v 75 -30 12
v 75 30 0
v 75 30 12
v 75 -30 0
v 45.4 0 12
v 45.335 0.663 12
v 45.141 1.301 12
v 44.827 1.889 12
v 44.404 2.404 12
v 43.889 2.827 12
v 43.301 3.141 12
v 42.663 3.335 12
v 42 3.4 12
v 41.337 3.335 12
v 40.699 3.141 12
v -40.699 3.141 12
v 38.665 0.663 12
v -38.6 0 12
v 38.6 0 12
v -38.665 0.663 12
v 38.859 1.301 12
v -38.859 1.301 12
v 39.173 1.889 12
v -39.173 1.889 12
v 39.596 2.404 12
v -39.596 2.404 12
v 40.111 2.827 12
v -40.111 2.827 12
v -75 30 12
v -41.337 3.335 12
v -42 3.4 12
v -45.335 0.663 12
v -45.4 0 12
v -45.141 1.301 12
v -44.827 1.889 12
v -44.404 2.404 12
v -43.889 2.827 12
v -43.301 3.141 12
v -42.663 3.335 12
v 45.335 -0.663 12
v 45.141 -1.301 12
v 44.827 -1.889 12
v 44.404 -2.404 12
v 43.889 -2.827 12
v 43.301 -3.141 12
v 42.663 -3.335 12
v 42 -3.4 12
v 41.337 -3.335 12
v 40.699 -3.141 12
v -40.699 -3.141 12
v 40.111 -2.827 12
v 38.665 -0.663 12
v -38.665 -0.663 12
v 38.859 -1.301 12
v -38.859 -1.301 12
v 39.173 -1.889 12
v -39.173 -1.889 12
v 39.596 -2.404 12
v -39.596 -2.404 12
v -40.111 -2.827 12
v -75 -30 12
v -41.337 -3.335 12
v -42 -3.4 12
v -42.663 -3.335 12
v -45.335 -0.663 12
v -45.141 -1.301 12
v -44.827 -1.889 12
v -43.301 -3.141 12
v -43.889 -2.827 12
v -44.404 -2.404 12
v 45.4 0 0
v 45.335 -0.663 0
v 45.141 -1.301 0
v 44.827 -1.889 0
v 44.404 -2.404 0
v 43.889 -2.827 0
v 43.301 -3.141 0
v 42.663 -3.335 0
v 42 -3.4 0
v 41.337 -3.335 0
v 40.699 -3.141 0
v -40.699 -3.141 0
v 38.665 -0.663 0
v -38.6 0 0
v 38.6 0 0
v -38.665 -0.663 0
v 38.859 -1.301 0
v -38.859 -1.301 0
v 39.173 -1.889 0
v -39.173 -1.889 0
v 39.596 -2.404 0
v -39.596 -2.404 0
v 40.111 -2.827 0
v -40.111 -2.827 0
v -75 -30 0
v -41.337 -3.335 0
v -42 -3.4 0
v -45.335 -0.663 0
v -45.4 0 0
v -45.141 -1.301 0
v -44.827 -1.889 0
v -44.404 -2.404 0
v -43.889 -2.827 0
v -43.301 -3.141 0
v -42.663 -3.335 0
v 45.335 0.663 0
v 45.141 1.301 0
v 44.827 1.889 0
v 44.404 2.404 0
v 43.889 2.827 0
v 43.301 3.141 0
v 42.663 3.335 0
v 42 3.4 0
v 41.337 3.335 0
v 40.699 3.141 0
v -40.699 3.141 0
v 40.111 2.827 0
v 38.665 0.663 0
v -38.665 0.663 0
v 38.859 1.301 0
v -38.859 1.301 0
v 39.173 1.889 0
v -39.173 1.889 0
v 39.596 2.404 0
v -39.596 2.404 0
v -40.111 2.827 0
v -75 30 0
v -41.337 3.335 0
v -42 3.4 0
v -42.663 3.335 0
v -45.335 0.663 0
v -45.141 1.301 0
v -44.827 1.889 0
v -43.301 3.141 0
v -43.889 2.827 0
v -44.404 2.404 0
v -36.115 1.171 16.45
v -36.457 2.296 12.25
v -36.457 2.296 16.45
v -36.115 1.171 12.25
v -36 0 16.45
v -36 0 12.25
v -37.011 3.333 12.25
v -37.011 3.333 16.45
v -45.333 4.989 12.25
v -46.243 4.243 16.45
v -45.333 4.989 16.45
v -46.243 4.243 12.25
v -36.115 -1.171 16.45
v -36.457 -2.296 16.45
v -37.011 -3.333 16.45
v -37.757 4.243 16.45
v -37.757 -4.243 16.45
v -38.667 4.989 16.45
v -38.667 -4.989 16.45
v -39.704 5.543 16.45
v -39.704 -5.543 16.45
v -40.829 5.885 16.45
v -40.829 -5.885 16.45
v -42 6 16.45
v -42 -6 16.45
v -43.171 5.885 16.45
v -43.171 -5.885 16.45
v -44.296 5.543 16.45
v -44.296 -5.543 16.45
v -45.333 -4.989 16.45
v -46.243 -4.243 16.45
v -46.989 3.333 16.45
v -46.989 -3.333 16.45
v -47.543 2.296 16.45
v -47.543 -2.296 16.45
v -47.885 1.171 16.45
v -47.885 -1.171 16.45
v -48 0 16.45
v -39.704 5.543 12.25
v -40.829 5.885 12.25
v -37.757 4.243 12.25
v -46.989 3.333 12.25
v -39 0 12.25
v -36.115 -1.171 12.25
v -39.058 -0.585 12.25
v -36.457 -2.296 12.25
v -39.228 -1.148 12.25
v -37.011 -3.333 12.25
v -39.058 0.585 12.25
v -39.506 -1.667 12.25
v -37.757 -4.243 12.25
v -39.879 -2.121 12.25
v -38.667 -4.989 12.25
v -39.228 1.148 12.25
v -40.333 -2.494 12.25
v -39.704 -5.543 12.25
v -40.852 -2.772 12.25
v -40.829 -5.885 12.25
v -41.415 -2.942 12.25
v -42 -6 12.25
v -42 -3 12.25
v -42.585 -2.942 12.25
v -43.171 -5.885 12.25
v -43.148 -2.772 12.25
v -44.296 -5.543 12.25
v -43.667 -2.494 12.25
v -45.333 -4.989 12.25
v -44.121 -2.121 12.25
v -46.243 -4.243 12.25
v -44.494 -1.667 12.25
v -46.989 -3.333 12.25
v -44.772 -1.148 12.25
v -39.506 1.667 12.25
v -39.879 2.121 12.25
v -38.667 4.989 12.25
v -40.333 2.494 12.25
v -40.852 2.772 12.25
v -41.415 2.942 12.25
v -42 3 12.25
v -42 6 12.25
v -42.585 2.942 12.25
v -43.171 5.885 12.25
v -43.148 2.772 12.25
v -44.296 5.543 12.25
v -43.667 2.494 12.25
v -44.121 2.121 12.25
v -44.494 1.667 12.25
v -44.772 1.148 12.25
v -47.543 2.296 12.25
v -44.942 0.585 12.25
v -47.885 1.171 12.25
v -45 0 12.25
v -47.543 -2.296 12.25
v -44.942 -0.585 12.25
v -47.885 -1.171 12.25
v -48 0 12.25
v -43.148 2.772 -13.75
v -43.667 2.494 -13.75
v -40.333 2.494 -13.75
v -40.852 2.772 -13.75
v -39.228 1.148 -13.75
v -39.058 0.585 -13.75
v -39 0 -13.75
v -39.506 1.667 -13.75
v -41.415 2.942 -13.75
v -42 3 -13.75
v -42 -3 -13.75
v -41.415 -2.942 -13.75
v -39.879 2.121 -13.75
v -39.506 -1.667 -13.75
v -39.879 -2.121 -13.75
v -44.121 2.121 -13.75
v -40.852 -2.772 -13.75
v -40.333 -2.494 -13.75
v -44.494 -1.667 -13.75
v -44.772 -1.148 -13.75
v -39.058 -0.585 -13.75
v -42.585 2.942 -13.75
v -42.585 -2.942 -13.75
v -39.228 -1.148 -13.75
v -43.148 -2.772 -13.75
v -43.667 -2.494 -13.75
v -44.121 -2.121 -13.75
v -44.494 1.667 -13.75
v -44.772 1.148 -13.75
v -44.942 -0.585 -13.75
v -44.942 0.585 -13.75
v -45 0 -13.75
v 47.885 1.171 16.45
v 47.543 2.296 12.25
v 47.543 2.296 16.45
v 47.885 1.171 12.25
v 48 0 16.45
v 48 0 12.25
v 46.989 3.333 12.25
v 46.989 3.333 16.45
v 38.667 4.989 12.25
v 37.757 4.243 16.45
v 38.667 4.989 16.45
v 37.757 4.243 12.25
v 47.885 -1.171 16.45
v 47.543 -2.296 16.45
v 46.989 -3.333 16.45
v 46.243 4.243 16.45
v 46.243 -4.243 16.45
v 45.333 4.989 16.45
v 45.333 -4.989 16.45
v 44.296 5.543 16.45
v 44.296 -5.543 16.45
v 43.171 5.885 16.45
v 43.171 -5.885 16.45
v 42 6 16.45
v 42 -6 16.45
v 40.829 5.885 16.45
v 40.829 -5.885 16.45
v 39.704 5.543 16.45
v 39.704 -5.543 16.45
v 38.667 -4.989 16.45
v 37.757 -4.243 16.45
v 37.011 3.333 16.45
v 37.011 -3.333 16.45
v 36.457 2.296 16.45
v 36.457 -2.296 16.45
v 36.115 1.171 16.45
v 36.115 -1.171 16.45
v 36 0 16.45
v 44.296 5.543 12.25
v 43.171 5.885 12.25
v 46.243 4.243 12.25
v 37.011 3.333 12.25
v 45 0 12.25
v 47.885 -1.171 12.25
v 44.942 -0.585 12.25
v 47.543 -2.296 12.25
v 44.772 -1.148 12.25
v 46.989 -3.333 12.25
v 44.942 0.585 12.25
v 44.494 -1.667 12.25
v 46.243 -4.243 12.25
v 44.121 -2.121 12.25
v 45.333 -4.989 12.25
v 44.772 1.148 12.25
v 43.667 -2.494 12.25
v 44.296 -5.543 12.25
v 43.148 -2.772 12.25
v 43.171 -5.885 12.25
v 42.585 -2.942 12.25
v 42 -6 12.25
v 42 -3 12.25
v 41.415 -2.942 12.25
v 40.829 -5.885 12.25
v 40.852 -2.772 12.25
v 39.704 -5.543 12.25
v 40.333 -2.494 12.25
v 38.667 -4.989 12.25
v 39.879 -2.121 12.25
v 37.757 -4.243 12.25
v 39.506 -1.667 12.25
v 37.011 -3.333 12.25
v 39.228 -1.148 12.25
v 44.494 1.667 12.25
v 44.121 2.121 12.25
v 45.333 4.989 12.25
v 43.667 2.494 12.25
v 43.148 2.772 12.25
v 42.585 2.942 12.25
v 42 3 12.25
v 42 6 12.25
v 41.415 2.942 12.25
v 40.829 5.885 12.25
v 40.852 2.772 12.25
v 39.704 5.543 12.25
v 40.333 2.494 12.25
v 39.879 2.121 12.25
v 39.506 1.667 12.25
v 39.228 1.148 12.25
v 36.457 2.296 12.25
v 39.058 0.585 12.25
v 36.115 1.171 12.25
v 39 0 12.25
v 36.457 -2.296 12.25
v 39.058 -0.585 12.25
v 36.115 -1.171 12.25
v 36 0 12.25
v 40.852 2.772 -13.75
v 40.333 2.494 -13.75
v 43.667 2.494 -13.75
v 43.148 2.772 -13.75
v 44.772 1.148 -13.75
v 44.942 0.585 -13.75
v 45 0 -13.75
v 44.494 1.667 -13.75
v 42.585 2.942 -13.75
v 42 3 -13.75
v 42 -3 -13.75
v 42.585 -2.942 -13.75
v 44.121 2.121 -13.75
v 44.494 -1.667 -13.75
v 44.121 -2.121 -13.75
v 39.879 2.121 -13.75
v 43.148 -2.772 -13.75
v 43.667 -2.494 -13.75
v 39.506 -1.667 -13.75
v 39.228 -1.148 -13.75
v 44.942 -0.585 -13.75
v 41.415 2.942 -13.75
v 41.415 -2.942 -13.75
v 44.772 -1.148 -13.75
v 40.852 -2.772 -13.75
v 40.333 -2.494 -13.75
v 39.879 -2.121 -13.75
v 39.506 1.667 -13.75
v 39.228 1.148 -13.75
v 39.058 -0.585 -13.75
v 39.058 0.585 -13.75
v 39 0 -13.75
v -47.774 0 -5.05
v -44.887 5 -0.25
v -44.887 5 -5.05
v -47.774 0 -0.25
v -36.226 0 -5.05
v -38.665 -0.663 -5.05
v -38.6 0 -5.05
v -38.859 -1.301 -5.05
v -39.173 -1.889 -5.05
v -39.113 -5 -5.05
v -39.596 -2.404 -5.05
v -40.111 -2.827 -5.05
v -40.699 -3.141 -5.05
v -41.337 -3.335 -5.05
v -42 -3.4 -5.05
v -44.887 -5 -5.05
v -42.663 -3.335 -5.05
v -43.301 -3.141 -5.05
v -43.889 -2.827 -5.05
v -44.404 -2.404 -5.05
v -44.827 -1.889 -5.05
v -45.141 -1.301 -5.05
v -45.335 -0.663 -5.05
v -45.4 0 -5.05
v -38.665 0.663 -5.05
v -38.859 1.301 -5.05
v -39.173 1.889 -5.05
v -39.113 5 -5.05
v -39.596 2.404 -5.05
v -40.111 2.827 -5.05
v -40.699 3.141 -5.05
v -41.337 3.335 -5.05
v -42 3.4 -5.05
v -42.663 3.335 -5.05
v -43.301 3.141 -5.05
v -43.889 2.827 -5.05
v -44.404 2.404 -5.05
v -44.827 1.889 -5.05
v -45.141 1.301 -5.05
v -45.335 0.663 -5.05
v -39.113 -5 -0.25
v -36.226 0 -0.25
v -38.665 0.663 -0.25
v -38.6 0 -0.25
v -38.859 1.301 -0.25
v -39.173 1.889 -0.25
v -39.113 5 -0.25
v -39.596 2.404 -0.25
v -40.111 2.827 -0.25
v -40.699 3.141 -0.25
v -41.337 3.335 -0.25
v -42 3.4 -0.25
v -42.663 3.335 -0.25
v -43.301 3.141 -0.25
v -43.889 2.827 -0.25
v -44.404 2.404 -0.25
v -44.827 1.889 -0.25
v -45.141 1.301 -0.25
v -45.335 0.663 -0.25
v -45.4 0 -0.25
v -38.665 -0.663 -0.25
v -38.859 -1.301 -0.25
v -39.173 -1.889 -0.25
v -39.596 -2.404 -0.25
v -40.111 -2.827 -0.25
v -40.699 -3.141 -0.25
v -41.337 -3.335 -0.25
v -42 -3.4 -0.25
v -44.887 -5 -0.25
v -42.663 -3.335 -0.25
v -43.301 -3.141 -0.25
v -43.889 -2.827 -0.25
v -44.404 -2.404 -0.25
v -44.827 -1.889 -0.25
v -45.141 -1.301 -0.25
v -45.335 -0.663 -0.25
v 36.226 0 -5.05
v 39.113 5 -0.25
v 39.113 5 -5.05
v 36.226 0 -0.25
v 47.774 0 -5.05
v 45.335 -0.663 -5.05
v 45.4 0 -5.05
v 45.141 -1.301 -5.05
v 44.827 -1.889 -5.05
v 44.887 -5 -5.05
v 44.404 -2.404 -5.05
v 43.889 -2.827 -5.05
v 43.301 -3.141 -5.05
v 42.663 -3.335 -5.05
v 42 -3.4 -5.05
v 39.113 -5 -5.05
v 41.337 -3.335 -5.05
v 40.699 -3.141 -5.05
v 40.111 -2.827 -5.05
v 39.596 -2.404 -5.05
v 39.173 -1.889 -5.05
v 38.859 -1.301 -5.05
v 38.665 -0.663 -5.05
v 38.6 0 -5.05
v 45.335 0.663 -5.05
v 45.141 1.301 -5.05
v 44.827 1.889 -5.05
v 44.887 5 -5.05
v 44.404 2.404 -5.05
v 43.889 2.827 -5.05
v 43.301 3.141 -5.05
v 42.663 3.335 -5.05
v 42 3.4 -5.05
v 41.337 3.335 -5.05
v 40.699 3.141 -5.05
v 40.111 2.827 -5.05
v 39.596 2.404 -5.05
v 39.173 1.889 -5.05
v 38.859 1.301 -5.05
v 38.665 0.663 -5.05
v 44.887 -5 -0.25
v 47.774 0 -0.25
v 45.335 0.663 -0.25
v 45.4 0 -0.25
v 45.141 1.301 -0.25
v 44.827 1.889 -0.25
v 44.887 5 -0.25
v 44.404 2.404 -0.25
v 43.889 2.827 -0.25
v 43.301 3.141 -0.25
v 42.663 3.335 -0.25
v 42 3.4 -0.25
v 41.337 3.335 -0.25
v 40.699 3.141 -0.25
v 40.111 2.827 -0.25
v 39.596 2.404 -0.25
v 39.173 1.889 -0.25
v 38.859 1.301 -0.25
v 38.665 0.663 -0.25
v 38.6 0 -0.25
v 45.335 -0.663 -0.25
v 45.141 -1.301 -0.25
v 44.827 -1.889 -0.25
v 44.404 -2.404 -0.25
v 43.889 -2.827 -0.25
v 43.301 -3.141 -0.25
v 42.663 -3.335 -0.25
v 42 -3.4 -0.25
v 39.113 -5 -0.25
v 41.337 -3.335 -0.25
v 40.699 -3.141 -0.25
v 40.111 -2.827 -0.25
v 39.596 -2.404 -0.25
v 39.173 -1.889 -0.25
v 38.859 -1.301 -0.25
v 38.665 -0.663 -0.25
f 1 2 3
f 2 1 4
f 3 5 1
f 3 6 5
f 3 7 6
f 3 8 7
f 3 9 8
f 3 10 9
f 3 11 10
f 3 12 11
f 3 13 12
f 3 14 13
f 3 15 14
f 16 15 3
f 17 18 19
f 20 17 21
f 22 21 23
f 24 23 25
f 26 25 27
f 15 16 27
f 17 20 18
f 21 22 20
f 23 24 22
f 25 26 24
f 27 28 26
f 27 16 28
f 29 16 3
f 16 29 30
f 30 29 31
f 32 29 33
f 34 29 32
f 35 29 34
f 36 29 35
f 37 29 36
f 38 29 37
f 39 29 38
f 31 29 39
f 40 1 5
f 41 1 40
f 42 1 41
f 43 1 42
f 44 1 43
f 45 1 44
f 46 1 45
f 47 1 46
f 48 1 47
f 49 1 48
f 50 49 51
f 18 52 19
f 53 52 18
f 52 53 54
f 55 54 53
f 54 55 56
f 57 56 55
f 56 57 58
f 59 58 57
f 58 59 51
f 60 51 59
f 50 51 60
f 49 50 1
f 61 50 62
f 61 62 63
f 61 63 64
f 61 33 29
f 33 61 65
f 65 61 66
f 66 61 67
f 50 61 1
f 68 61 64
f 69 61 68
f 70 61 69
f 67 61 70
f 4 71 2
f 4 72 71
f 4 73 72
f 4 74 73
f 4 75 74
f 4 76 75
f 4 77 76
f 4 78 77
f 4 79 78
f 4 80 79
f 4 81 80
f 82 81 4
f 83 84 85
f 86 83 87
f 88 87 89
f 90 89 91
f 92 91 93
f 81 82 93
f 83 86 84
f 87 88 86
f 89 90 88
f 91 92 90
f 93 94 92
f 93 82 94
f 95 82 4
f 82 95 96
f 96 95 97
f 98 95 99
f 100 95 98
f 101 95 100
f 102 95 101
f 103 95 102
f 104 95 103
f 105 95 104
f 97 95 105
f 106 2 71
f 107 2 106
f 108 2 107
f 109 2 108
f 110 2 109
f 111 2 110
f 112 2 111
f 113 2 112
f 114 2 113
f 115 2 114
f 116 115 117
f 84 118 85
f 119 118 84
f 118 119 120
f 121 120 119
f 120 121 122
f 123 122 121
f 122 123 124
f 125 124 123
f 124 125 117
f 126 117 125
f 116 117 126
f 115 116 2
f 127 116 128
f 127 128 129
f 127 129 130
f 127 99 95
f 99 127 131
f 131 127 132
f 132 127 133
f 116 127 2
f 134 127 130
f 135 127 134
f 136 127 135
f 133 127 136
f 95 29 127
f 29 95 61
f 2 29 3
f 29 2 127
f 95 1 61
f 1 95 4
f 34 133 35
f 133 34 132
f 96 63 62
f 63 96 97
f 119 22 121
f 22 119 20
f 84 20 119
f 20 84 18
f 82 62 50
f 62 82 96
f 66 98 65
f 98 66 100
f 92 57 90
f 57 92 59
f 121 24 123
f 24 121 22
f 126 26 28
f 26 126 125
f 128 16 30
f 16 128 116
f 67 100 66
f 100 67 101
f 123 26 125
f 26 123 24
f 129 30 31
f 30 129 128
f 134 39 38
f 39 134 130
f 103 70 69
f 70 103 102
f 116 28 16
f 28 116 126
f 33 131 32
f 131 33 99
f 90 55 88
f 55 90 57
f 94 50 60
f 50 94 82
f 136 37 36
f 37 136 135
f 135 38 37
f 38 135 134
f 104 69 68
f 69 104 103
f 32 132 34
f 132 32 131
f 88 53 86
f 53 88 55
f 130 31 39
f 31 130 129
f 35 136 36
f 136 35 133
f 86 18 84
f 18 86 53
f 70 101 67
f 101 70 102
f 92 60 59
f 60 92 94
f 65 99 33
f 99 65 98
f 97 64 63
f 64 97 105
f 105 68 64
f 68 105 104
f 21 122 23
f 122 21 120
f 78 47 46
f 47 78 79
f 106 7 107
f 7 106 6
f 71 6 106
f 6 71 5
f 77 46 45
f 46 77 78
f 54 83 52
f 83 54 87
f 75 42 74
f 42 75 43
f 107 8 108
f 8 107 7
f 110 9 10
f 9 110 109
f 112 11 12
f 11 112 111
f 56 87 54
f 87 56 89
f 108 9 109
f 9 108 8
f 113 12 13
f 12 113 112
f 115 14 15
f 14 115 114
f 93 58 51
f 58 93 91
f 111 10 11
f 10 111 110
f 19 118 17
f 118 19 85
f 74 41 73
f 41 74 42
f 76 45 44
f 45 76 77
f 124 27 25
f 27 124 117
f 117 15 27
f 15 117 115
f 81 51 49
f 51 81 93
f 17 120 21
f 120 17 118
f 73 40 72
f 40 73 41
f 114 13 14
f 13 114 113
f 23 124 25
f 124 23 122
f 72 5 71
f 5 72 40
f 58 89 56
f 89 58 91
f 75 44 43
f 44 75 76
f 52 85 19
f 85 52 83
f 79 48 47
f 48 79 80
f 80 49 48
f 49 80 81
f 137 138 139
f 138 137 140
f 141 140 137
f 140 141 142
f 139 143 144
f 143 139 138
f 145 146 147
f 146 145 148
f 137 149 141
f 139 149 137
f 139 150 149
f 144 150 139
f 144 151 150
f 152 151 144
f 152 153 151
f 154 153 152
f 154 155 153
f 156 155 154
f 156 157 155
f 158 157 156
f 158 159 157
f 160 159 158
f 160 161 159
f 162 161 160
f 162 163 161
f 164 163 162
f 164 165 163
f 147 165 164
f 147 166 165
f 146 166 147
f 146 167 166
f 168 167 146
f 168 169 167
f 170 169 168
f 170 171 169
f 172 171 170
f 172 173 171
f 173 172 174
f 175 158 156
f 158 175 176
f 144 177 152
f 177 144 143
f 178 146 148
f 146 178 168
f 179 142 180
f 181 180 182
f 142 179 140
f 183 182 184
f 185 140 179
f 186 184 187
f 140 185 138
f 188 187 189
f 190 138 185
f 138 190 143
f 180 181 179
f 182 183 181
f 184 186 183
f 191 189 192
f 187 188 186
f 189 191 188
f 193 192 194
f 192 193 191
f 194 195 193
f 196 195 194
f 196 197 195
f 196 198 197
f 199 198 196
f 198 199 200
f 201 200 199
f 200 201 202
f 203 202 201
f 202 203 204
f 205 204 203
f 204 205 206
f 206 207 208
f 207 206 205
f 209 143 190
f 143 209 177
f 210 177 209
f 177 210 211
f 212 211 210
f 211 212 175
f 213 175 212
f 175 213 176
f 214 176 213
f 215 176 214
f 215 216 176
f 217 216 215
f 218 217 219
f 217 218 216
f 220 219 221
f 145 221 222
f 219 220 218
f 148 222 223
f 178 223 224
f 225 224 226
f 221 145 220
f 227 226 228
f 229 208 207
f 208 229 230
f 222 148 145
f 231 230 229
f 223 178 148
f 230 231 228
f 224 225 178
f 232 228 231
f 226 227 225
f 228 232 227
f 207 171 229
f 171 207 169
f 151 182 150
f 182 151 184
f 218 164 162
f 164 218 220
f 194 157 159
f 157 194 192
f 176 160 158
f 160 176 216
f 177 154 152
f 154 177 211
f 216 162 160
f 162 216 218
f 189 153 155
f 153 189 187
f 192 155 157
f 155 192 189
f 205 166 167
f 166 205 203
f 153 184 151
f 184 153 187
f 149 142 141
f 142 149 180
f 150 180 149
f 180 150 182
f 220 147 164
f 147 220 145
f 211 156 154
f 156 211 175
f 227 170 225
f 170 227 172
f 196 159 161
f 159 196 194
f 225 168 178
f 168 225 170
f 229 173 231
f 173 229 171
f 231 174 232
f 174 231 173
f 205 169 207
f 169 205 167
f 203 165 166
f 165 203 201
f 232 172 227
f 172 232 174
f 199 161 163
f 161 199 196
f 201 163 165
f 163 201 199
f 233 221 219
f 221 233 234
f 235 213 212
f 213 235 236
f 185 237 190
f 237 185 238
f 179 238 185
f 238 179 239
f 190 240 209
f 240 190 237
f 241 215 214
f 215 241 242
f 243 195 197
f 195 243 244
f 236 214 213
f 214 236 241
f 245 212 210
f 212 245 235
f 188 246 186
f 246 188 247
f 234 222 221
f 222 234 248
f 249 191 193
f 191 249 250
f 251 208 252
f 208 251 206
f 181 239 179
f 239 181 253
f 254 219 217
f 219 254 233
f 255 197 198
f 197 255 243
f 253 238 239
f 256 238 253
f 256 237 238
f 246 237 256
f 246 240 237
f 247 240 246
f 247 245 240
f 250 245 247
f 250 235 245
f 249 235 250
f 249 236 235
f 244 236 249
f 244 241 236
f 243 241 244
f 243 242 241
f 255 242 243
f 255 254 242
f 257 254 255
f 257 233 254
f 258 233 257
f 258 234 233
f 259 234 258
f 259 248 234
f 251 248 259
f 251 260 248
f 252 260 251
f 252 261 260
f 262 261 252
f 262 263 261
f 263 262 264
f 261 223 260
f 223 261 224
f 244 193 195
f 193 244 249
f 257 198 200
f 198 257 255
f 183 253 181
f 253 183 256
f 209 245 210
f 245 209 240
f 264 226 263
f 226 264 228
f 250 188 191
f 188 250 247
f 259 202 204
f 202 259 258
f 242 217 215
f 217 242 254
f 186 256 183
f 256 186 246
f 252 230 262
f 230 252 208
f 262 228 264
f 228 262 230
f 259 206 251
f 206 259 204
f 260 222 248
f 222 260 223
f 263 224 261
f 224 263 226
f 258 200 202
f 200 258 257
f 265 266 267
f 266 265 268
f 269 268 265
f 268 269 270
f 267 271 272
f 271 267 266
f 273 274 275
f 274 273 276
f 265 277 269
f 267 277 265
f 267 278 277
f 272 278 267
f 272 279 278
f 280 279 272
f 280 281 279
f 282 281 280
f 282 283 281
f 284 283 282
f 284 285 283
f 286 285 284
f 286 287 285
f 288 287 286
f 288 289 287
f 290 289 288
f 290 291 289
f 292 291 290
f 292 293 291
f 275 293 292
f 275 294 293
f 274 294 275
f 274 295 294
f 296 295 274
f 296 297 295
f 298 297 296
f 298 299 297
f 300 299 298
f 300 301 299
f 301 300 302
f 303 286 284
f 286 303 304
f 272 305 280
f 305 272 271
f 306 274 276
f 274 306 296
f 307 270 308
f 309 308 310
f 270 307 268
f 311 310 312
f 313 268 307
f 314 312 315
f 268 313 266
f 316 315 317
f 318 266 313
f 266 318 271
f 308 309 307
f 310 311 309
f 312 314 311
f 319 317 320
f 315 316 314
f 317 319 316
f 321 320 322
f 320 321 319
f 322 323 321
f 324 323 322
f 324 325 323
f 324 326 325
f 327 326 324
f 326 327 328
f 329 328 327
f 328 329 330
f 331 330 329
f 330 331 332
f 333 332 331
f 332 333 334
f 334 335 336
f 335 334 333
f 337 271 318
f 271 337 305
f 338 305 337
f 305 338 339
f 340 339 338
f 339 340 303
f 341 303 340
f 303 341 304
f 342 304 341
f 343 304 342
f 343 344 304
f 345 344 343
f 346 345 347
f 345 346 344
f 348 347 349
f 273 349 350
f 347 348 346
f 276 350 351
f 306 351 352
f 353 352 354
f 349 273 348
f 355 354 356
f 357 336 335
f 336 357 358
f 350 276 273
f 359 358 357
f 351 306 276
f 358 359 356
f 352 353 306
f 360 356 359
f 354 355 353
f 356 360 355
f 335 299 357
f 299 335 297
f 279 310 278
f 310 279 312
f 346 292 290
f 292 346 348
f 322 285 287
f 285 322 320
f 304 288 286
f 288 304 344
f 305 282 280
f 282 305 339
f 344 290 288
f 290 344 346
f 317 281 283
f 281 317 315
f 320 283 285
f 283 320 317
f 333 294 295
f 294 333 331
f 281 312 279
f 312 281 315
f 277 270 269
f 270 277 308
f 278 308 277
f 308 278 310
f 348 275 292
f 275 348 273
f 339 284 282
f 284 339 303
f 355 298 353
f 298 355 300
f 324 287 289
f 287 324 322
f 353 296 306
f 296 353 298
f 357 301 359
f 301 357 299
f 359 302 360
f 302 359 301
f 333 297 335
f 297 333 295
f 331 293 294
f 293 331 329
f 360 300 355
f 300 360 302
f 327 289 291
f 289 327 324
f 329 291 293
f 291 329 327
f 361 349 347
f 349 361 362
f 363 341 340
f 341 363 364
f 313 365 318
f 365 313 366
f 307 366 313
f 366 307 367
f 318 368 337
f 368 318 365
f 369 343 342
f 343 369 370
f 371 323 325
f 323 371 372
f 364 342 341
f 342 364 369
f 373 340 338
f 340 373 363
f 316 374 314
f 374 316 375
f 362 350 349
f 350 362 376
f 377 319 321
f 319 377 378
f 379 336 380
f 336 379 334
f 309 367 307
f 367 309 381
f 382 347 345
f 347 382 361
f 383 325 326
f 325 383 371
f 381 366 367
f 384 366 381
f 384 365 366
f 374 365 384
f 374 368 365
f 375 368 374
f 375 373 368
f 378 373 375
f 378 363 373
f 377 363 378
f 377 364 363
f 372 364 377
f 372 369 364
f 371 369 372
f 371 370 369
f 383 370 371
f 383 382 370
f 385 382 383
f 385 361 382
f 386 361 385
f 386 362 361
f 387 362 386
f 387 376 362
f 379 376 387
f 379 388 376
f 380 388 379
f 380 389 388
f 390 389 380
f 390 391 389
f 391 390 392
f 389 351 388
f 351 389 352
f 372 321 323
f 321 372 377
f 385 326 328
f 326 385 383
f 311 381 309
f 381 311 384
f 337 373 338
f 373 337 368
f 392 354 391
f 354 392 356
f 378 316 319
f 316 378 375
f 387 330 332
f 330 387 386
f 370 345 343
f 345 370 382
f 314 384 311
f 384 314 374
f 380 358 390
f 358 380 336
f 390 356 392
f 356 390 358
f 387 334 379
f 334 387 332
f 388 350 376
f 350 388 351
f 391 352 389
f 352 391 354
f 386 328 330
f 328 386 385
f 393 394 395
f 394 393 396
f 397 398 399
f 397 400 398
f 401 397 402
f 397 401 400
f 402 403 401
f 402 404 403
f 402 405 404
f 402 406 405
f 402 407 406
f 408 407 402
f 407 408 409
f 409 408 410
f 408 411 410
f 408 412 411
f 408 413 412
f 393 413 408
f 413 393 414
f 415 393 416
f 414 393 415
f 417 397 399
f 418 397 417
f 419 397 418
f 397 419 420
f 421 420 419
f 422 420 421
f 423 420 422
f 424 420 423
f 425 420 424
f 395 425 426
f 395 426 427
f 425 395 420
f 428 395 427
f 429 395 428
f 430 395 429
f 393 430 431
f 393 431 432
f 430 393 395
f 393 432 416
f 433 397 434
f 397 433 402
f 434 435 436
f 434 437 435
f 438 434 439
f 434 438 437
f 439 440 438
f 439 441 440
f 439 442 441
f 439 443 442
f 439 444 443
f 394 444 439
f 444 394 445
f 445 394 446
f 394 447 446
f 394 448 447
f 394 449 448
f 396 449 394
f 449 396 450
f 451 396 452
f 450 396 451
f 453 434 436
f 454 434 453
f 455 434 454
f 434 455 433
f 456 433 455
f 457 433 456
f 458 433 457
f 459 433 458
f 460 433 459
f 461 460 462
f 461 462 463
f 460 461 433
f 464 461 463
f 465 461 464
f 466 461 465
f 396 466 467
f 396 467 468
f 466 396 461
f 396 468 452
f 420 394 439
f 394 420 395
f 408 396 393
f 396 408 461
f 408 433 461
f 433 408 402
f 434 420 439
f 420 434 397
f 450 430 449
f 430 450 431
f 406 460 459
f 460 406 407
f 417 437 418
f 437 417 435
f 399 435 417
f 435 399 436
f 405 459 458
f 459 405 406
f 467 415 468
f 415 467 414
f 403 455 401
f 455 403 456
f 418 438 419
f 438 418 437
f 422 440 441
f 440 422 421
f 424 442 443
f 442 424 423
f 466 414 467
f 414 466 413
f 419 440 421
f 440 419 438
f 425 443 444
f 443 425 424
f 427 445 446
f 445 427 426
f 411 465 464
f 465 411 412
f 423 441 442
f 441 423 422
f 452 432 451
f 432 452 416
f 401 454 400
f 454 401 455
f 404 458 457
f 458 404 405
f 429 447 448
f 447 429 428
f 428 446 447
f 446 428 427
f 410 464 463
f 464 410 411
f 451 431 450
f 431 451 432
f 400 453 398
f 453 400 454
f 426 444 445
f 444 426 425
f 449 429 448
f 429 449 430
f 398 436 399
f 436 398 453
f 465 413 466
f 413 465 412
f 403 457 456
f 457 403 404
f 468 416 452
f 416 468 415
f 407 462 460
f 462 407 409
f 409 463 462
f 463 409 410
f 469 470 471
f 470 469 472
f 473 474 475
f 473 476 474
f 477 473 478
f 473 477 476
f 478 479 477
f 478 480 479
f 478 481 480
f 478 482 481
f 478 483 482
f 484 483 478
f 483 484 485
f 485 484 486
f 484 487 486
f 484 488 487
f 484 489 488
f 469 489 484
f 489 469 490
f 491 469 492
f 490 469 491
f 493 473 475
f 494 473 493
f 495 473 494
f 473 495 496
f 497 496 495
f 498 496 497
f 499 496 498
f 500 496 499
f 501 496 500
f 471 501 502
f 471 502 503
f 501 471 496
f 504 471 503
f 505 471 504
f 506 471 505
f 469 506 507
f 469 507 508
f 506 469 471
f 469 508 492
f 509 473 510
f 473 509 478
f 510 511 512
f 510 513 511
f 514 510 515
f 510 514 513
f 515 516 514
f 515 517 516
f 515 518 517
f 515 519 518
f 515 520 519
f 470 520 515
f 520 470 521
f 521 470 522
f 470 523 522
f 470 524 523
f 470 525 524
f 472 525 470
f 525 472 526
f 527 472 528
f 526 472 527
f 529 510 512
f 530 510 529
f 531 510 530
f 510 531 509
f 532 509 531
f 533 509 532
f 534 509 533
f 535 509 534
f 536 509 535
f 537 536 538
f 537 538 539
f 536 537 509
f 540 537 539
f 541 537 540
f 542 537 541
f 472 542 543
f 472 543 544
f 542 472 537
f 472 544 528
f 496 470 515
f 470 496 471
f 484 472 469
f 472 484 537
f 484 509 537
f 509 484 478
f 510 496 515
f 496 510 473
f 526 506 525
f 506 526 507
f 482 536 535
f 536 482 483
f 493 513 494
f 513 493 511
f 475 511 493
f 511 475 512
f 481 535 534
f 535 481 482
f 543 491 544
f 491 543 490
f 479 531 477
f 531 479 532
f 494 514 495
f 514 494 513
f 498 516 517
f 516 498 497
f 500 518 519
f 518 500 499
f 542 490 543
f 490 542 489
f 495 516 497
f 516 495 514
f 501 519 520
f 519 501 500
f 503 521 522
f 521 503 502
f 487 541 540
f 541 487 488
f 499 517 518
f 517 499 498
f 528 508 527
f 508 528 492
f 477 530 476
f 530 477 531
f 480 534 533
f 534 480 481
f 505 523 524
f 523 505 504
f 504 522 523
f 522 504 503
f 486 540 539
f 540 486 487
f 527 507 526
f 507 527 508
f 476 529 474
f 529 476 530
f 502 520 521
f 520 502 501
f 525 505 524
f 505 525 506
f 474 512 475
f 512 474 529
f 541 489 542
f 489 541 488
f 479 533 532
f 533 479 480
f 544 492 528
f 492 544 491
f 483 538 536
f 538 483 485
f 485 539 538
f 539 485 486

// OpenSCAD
$fn = 32;

// ------------------------------------------------------------------------
// Bolted plate: 150 x 60 x 12 mm plate, 2 fasteners
// Every part is its own module, assembly() places them once.
// ------------------------------------------------------------------------

// --- part 1 ---
module plate() {
  difference() {
    translate([-75, -30, 0]) cube([150, 60, 12]);
    translate([-42, 0, -1]) cylinder(h = 14, d = 6.8);
    translate([42, 0, -1]) cylinder(h = 14, d = 6.8);
  }
}

// --- part 2 ---
module bolt1() {
  cylinder(h = 4.2, d = 12);
  translate([0, 0, -26]) cylinder(h = 26, d = 6);
}

// --- part 3 ---
module bolt2() {
  cylinder(h = 4.2, d = 12);
  translate([0, 0, -26]) cylinder(h = 26, d = 6);
}

// --- part 4 ---
module nut1() {
  difference() {
    linear_extrude(height = 4.8) polygon(points = [[5.774, 0], [2.887, 5], [-2.887, 5], [-5.774, 0], [-2.887, -5], [2.887, -5]]);
    translate([0, 0, -1]) cylinder(h = 6.8, d = 6.8);
  }
}

// --- part 5 ---
module nut2() {
  difference() {
    linear_extrude(height = 4.8) polygon(points = [[5.774, 0], [2.887, 5], [-2.887, 5], [-5.774, 0], [-2.887, -5], [2.887, -5]]);
    translate([0, 0, -1]) cylinder(h = 6.8, d = 6.8);
  }
}

// --- assembly ---
module assembly() {
  translate([0, 0, 0]) rotate([0, 0, 0]) plate();
  translate([-42, 0, 12.25]) rotate([0, 0, 0]) bolt1();
  translate([42, 0, 12.25]) rotate([0, 0, 0]) bolt2();
  translate([-42, 0, -5.05]) rotate([0, 0, 0]) nut1();
  translate([42, 0, -5.05]) rotate([0, 0, 0]) nut2();
}

assembly();
